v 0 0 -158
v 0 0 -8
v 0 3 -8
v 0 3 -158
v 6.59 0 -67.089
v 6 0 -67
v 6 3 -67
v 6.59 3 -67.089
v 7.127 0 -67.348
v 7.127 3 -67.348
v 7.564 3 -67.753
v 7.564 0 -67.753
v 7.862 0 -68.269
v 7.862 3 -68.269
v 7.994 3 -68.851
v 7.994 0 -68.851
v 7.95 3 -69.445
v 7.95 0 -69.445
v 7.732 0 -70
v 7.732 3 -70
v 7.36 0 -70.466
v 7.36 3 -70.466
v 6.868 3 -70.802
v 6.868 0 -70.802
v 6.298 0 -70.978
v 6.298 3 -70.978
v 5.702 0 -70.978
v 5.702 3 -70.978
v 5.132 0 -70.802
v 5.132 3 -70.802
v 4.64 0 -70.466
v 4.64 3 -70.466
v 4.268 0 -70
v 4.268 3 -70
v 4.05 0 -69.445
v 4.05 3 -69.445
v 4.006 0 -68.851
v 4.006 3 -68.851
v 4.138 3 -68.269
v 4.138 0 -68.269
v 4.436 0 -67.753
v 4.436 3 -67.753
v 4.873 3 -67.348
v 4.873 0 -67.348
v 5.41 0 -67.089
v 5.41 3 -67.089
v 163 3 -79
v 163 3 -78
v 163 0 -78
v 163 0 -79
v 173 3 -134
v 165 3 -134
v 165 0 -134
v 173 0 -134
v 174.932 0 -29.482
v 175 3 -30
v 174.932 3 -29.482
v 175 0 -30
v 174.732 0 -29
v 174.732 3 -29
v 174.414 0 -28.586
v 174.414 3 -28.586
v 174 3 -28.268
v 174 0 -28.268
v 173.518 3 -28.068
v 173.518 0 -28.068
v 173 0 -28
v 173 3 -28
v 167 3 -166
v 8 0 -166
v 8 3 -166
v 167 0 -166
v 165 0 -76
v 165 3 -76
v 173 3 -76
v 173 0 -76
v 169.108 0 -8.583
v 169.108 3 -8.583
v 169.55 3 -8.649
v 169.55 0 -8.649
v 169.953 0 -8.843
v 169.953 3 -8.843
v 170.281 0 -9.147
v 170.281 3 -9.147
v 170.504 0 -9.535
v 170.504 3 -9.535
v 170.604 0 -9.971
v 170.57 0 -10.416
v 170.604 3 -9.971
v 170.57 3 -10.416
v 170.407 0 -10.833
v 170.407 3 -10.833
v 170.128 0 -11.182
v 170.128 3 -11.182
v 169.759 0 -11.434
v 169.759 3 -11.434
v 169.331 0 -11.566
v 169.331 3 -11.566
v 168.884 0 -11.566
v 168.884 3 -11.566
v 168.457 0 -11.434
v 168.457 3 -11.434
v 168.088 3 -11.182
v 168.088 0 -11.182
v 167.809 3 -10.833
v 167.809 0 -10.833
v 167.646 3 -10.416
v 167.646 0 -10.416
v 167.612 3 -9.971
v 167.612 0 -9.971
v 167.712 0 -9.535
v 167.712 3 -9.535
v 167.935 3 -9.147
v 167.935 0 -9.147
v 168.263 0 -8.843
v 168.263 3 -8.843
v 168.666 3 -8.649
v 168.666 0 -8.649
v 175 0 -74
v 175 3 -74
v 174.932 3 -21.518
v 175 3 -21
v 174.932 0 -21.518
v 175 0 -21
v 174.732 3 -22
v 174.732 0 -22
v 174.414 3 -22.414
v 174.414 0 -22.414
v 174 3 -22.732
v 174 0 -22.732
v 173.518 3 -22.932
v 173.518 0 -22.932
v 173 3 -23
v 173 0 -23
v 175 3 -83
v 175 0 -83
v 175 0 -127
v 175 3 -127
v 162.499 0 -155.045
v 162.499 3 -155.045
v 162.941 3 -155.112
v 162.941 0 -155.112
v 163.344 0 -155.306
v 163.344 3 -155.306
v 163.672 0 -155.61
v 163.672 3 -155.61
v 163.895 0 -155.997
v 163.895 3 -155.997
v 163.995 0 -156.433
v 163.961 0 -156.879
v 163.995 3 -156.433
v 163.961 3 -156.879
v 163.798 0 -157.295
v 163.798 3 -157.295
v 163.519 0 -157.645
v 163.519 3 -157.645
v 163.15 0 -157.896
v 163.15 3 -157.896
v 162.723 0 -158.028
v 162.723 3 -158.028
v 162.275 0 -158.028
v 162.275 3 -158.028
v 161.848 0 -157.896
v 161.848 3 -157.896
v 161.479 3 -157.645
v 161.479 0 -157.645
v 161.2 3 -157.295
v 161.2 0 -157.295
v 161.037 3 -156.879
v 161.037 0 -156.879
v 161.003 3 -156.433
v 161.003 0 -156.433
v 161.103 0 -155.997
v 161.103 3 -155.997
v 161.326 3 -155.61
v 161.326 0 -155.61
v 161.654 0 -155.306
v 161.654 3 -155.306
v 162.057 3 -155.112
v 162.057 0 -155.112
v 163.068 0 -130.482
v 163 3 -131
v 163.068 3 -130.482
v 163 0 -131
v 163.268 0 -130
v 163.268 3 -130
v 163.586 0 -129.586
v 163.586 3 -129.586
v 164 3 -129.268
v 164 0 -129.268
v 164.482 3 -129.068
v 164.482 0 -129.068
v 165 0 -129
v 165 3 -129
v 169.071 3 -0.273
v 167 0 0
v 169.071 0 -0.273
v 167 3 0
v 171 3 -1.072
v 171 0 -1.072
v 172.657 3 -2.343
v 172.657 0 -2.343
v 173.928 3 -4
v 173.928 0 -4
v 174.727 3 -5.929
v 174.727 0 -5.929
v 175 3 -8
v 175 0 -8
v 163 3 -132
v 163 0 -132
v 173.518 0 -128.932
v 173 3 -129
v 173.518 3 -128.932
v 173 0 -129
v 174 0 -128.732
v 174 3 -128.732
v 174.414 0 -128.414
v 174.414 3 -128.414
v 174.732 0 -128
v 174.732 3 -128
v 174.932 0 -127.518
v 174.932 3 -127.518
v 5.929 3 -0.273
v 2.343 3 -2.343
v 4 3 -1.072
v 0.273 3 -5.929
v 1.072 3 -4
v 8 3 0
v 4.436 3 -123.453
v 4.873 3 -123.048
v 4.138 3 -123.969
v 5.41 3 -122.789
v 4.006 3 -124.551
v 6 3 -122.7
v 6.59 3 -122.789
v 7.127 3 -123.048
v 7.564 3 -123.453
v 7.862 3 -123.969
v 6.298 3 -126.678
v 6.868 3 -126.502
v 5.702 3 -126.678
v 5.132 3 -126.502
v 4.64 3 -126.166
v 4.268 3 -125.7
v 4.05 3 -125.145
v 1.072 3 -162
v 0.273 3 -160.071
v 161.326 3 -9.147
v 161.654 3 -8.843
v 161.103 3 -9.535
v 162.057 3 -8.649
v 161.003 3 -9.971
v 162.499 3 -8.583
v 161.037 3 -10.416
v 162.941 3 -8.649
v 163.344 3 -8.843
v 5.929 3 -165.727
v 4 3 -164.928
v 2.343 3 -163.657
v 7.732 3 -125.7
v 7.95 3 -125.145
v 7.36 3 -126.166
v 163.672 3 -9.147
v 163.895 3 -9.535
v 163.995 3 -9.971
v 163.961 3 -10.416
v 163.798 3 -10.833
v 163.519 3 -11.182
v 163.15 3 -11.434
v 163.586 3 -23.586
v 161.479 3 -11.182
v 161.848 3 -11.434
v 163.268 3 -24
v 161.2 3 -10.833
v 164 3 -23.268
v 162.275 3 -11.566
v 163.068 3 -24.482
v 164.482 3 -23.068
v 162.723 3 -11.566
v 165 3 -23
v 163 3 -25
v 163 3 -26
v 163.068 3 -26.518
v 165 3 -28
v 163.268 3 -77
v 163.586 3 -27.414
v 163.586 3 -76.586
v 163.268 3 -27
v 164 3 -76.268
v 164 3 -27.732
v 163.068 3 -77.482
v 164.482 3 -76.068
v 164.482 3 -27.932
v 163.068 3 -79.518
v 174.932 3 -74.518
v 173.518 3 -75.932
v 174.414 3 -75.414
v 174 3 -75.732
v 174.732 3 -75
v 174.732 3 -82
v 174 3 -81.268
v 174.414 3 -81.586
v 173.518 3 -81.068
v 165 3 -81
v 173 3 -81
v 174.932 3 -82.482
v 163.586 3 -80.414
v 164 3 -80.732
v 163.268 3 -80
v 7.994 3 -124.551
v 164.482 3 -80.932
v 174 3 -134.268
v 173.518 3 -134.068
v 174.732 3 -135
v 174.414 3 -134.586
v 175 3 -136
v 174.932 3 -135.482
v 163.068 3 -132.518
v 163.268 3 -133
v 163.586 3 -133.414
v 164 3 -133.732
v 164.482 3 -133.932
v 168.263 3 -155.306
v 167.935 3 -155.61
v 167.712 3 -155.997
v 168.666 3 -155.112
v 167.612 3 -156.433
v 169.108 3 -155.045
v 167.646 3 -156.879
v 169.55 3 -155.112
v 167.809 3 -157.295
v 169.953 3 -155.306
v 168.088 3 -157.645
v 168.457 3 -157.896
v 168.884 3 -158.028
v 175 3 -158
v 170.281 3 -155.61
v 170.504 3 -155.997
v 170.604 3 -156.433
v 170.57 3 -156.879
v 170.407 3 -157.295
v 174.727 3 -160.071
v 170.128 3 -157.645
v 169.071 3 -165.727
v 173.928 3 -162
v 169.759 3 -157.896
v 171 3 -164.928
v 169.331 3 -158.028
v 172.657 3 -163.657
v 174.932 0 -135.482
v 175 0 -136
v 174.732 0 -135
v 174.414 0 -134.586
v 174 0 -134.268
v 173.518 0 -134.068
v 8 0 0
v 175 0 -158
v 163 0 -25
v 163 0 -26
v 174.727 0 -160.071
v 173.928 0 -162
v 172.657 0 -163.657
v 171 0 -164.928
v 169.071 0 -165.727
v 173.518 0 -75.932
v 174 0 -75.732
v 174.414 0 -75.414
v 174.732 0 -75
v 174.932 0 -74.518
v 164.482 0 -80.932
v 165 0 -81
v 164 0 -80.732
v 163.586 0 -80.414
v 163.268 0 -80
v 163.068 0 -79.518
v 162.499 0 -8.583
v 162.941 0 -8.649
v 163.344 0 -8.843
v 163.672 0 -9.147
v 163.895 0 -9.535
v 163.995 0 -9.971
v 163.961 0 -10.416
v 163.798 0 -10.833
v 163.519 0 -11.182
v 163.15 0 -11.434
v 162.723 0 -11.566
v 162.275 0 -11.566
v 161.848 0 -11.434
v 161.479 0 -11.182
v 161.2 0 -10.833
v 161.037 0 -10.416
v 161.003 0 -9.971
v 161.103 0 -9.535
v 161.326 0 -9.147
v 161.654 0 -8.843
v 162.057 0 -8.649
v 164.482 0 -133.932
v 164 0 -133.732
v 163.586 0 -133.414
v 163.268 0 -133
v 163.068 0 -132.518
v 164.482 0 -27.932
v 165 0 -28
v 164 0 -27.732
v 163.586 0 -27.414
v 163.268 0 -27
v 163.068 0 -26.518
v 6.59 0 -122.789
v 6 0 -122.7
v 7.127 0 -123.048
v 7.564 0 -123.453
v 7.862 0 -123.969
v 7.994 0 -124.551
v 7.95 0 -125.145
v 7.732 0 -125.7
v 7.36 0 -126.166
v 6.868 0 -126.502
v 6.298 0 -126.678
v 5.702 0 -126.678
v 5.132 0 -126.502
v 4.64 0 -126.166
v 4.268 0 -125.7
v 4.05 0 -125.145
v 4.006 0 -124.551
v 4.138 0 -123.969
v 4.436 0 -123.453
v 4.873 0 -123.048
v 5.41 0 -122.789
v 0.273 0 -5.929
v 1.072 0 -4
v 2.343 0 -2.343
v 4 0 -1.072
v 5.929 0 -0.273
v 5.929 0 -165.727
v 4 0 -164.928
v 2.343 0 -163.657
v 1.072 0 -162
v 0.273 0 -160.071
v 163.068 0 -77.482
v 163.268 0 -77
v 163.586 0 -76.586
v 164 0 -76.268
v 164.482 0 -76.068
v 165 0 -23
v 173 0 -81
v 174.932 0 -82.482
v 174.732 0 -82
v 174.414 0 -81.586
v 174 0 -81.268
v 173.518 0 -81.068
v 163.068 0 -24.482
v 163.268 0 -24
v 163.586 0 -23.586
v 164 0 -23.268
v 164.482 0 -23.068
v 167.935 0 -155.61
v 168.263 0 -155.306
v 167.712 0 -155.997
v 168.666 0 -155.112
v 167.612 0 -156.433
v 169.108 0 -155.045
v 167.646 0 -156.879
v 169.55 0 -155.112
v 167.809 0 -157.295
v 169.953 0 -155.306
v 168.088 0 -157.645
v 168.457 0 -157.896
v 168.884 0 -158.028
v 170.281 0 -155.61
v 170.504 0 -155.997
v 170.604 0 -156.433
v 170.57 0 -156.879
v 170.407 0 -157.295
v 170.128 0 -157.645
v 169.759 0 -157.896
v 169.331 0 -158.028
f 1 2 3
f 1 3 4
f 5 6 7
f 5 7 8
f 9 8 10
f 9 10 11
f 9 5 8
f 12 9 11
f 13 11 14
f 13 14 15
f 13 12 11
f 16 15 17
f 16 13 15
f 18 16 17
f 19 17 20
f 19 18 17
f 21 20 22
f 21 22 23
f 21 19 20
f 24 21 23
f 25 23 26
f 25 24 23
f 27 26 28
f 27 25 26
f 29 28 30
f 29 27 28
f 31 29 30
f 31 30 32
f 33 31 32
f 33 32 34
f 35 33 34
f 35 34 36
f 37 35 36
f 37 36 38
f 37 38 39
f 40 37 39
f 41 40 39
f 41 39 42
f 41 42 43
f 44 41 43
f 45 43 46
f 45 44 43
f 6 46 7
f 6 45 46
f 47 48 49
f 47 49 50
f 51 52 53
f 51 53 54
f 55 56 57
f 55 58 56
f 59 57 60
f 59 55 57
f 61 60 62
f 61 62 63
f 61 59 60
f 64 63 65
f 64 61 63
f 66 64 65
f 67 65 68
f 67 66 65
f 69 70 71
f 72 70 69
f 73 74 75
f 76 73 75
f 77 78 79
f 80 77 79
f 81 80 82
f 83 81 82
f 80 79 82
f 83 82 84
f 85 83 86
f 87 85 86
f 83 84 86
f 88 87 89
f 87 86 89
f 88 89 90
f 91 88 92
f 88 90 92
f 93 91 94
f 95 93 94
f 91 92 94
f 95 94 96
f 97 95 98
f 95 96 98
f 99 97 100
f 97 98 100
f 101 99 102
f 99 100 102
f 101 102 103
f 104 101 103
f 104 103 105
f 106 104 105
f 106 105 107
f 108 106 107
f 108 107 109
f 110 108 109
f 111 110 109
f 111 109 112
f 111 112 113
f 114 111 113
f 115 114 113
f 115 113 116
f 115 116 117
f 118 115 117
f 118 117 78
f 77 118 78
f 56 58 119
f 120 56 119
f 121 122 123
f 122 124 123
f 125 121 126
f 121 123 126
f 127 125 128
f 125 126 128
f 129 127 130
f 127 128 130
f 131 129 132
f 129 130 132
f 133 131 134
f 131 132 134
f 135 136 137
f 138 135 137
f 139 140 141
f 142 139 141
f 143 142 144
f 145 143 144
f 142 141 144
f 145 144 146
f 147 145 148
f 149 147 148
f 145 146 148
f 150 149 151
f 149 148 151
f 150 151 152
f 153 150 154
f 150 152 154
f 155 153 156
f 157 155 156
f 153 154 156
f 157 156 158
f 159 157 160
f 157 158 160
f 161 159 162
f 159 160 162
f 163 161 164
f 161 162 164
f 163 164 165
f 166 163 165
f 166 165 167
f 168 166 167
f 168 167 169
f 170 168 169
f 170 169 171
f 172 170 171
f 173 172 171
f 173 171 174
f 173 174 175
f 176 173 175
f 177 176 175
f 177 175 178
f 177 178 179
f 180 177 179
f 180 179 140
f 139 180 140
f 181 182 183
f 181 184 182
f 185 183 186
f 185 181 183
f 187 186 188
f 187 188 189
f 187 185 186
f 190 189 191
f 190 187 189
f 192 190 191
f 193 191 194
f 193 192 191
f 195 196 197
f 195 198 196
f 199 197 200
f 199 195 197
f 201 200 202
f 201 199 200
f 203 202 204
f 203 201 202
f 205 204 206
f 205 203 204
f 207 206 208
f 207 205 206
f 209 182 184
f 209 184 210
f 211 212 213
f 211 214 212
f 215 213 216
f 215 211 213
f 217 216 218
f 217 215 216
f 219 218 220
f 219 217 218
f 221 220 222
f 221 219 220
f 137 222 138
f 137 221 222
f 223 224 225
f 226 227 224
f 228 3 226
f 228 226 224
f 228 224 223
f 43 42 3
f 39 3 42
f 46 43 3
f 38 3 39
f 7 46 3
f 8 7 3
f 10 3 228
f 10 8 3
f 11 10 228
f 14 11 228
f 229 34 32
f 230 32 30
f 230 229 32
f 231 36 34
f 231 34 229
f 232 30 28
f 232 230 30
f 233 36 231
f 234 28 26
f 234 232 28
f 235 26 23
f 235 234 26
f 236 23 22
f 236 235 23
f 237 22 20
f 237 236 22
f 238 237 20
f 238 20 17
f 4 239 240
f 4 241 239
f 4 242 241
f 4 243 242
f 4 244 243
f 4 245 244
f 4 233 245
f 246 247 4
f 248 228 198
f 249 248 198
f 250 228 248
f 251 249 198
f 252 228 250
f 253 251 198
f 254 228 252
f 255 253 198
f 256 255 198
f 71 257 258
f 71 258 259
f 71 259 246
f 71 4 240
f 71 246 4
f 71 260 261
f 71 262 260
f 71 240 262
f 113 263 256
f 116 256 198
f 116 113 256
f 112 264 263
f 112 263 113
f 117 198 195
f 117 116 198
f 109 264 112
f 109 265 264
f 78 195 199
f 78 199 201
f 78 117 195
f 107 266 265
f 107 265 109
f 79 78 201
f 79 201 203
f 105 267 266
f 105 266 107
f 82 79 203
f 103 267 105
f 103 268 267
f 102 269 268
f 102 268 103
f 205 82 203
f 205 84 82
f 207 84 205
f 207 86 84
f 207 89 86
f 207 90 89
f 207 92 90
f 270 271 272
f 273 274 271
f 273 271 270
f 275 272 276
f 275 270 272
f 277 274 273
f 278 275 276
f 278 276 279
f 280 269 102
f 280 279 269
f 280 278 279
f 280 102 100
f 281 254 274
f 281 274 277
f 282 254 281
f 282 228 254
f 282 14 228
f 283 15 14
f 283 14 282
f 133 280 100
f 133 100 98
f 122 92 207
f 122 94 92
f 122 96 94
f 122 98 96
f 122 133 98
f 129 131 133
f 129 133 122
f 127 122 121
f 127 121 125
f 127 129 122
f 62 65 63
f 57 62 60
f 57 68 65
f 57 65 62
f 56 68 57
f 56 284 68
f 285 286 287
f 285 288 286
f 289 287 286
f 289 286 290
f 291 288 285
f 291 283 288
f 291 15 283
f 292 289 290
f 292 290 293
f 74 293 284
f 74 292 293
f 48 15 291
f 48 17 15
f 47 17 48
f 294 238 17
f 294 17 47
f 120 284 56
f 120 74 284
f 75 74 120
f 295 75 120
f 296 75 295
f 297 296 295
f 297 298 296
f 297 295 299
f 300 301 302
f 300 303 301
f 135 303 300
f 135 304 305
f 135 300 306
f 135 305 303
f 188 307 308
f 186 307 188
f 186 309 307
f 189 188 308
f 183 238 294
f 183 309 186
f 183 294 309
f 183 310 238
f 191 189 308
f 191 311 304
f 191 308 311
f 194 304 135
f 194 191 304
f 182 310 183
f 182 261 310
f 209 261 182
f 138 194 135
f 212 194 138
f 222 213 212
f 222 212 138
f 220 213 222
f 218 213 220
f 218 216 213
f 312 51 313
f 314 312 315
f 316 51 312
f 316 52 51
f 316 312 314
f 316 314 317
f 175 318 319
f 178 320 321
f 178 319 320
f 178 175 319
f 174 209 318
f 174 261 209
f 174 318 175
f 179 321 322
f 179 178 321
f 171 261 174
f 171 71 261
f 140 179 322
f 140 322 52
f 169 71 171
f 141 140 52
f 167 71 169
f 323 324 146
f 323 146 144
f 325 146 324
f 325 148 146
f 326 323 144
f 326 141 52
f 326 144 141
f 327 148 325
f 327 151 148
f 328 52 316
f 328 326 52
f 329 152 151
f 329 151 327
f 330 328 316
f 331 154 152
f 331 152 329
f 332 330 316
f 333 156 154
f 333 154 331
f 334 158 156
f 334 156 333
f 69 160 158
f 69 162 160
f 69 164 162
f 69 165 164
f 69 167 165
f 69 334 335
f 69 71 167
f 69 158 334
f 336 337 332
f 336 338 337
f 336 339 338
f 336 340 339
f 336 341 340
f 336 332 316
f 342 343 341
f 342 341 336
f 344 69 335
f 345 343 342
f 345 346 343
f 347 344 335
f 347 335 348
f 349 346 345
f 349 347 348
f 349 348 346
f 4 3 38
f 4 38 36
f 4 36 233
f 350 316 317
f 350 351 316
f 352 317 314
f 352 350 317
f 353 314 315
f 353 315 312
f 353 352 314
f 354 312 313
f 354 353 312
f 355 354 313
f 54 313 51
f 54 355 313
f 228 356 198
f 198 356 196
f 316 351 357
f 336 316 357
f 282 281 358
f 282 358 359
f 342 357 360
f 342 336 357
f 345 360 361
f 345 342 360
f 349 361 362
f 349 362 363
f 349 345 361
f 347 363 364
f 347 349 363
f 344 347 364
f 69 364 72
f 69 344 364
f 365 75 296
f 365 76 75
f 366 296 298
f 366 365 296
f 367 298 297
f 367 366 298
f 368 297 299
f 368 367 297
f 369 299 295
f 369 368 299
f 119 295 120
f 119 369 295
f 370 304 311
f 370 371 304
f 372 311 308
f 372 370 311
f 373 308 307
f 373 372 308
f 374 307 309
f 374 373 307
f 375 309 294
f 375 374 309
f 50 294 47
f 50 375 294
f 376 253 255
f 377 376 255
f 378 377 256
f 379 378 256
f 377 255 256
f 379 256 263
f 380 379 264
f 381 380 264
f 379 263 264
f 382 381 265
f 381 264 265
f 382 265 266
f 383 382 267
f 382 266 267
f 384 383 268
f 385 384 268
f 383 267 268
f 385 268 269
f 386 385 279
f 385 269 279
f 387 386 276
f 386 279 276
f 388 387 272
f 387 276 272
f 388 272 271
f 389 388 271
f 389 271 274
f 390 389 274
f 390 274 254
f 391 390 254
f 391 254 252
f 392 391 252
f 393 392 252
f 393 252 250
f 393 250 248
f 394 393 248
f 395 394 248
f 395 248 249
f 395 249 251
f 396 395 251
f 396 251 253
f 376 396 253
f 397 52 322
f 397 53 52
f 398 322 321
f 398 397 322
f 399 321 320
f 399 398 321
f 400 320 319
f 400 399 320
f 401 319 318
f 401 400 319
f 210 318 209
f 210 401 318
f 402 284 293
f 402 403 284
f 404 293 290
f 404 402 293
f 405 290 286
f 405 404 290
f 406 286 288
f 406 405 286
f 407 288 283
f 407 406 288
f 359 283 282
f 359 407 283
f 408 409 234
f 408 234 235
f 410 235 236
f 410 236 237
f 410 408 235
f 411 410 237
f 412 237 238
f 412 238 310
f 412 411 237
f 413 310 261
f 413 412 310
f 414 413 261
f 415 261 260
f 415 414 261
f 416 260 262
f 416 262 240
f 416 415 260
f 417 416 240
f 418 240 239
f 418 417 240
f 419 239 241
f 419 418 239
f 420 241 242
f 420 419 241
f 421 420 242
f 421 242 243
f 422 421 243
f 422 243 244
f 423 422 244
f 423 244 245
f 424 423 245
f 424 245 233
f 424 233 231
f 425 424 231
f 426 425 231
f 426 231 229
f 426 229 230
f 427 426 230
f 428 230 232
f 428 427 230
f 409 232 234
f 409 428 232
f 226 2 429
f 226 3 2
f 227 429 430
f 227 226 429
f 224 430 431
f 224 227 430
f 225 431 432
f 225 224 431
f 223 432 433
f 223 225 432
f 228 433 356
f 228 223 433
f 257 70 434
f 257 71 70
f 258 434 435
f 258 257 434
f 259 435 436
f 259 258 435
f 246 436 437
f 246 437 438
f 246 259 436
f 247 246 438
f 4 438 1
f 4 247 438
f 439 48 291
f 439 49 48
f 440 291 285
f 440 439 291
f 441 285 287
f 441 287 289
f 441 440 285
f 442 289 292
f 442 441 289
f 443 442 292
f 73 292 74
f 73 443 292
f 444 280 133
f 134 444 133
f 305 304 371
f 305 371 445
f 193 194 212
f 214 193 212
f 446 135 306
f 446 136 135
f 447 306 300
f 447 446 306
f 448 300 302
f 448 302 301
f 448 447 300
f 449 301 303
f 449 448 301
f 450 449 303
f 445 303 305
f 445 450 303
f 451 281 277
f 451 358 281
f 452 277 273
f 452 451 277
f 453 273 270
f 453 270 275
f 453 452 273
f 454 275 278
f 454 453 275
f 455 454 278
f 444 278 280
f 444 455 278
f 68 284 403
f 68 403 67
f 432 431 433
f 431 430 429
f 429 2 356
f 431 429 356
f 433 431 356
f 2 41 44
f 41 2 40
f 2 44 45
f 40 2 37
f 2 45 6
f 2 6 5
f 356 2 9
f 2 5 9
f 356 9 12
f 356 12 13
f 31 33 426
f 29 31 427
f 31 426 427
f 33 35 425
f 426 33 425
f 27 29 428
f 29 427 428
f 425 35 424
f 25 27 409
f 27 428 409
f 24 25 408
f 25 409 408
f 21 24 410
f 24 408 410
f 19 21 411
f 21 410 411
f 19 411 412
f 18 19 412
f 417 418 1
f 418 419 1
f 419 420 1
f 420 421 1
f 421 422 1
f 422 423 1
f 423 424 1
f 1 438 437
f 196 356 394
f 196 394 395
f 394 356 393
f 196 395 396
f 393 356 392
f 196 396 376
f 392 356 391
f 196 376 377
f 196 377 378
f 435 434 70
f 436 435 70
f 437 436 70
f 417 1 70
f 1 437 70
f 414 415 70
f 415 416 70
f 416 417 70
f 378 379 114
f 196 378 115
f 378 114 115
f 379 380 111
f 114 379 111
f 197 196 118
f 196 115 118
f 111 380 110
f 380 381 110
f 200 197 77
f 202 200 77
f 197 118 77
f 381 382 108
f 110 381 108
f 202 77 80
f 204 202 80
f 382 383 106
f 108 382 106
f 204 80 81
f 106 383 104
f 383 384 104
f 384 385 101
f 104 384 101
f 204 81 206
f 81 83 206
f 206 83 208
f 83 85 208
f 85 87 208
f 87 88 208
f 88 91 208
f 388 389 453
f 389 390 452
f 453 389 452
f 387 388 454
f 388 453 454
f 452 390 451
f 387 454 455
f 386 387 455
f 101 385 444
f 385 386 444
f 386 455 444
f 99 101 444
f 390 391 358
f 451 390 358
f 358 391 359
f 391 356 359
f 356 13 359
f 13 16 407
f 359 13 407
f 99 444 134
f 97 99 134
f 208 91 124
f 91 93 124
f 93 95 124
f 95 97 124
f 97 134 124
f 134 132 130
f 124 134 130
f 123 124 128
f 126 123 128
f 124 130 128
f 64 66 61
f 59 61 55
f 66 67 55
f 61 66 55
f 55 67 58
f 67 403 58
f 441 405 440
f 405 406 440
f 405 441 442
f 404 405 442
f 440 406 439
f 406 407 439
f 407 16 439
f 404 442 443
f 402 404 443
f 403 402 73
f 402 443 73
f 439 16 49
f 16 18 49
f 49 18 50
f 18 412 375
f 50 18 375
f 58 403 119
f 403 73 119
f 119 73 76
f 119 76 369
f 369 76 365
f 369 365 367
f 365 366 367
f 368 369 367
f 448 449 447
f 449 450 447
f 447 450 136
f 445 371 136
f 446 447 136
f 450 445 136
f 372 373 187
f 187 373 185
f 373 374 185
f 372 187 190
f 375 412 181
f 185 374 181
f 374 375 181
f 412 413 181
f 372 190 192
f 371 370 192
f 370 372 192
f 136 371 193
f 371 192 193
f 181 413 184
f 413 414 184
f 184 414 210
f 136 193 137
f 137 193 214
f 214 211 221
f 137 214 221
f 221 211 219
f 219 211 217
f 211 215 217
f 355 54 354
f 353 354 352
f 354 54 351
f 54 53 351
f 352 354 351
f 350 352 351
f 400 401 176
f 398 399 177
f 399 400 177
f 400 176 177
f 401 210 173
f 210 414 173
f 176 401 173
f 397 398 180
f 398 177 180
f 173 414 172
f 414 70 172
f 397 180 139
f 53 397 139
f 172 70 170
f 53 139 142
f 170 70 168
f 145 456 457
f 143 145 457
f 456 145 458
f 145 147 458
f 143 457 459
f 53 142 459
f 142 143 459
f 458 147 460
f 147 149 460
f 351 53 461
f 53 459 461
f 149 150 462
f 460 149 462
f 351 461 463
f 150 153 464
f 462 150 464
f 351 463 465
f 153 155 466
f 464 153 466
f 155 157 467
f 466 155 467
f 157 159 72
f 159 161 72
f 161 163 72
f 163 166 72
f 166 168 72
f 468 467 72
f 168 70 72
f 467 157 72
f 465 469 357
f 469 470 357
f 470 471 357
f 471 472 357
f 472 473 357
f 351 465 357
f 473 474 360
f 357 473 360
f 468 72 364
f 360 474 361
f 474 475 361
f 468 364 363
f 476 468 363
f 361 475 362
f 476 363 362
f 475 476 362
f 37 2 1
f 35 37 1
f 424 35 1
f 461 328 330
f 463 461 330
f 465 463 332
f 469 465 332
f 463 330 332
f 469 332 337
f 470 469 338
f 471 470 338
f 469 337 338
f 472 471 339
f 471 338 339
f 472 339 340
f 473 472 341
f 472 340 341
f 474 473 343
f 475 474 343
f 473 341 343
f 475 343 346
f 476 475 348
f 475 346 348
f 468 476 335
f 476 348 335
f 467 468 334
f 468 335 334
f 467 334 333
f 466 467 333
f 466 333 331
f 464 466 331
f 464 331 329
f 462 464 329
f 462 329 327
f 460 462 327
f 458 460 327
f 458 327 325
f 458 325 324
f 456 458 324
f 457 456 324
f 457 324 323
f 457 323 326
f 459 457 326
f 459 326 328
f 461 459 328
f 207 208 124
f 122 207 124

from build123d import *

# Parameters (mm, degrees)
SKETCH_1_W          = 175
SKETCH_1_H          = 166
SKETCH_1_R          = 2
EXTRUDE_1_DEPTH     = 3
SKETCH_2_W          = 12
SKETCH_2_H          = 5
CUT_EXTRUDE_1_DEPTH = 242.226035079
FILLET_1_R          = 2
FILLET_2_R          = 8
SKETCH_4_R          = 1.5
CUT_EXTRUDE_3_DEPTH = 242.226035079


with BuildPart() as part:
    # 草图1 → 凸台-拉伸1 (new body)
    with BuildSketch(Plane(origin=(0, 0, 0), x_dir=(1, 0, 0), z_dir=(0, 1, 0))):
        with Locations((87.5, 83)):
            Rectangle(SKETCH_1_W, SKETCH_1_H)
        with Locations(Location((6, 124.7, 0), (0, 0, 270))):
            Circle(SKETCH_1_R, mode=Mode.SUBTRACT)
        with Locations(Location((6, 69, 0), (0, 0, 270))):
            Circle(SKETCH_1_R, mode=Mode.SUBTRACT)
    extrude(amount=EXTRUDE_1_DEPTH)

    # 草图2 → 切除-拉伸1 (cut, through all)
    with BuildSketch(Plane(origin=(0, 3, 0), x_dir=(1, 0, 0), z_dir=(0, 1, 0))):
        with Locations((169, 131.5)):
            Rectangle(SKETCH_2_W, SKETCH_2_H)
        with Locations((169, 78.5)):
            Rectangle(SKETCH_2_W, SKETCH_2_H)
        with Locations((169, 25.5)):
            Rectangle(SKETCH_2_W, SKETCH_2_H)
    extrude(amount=-CUT_EXTRUDE_1_DEPTH, mode=Mode.SUBTRACT)

    # 圆角1
    fillet_1_edges = [part.edges().sort_by_distance(p)[0] for p in [
        (175, 1.5, -134),
        (175, 1.5, -129),
        (163, 1.5, -129),
        (163, 1.5, -134),
        (175, 1.5, -81),
        (175, 1.5, -76),
        (163, 1.5, -76),
        (163, 1.5, -81),
        (175, 1.5, -28),
        (175, 1.5, -23),
        (163, 1.5, -23),
        (163, 1.5, -28),
    ]]
    fillet(fillet_1_edges, radius=FILLET_1_R)

    # 圆角2
    fillet_2_edges = [part.edges().sort_by_distance(p)[0] for p in [
        (0, 1.5, -166),
        (175, 1.5, -166),
        (175, 1.5, 0),
        (0, 1.5, 0),
    ]]
    fillet(fillet_2_edges, radius=FILLET_2_R)

    # 草图4 → 切除-拉伸3 (cut, through all)
    with BuildSketch(Plane(origin=(0, 3, 0), x_dir=(1, 0, 0), z_dir=(0, 1, 0))):
        with Locations(Location((162.499025796, 10.082661759, 0), (0, 0, 270))):
            Circle(SKETCH_4_R)
        with Locations(Location((169.107894404, 10.082661759, 0), (0, 0, 270))):
            Circle(SKETCH_4_R)
        with Locations(Location((162.499025796, 156.544971591, 0), (0, 0, 270))):
            Circle(SKETCH_4_R)
        with Locations(Location((169.107894404, 156.544971591, 0), (0, 0, 270))):
            Circle(SKETCH_4_R)
    extrude(amount=-CUT_EXTRUDE_3_DEPTH, mode=Mode.SUBTRACT)


solid = part.part
